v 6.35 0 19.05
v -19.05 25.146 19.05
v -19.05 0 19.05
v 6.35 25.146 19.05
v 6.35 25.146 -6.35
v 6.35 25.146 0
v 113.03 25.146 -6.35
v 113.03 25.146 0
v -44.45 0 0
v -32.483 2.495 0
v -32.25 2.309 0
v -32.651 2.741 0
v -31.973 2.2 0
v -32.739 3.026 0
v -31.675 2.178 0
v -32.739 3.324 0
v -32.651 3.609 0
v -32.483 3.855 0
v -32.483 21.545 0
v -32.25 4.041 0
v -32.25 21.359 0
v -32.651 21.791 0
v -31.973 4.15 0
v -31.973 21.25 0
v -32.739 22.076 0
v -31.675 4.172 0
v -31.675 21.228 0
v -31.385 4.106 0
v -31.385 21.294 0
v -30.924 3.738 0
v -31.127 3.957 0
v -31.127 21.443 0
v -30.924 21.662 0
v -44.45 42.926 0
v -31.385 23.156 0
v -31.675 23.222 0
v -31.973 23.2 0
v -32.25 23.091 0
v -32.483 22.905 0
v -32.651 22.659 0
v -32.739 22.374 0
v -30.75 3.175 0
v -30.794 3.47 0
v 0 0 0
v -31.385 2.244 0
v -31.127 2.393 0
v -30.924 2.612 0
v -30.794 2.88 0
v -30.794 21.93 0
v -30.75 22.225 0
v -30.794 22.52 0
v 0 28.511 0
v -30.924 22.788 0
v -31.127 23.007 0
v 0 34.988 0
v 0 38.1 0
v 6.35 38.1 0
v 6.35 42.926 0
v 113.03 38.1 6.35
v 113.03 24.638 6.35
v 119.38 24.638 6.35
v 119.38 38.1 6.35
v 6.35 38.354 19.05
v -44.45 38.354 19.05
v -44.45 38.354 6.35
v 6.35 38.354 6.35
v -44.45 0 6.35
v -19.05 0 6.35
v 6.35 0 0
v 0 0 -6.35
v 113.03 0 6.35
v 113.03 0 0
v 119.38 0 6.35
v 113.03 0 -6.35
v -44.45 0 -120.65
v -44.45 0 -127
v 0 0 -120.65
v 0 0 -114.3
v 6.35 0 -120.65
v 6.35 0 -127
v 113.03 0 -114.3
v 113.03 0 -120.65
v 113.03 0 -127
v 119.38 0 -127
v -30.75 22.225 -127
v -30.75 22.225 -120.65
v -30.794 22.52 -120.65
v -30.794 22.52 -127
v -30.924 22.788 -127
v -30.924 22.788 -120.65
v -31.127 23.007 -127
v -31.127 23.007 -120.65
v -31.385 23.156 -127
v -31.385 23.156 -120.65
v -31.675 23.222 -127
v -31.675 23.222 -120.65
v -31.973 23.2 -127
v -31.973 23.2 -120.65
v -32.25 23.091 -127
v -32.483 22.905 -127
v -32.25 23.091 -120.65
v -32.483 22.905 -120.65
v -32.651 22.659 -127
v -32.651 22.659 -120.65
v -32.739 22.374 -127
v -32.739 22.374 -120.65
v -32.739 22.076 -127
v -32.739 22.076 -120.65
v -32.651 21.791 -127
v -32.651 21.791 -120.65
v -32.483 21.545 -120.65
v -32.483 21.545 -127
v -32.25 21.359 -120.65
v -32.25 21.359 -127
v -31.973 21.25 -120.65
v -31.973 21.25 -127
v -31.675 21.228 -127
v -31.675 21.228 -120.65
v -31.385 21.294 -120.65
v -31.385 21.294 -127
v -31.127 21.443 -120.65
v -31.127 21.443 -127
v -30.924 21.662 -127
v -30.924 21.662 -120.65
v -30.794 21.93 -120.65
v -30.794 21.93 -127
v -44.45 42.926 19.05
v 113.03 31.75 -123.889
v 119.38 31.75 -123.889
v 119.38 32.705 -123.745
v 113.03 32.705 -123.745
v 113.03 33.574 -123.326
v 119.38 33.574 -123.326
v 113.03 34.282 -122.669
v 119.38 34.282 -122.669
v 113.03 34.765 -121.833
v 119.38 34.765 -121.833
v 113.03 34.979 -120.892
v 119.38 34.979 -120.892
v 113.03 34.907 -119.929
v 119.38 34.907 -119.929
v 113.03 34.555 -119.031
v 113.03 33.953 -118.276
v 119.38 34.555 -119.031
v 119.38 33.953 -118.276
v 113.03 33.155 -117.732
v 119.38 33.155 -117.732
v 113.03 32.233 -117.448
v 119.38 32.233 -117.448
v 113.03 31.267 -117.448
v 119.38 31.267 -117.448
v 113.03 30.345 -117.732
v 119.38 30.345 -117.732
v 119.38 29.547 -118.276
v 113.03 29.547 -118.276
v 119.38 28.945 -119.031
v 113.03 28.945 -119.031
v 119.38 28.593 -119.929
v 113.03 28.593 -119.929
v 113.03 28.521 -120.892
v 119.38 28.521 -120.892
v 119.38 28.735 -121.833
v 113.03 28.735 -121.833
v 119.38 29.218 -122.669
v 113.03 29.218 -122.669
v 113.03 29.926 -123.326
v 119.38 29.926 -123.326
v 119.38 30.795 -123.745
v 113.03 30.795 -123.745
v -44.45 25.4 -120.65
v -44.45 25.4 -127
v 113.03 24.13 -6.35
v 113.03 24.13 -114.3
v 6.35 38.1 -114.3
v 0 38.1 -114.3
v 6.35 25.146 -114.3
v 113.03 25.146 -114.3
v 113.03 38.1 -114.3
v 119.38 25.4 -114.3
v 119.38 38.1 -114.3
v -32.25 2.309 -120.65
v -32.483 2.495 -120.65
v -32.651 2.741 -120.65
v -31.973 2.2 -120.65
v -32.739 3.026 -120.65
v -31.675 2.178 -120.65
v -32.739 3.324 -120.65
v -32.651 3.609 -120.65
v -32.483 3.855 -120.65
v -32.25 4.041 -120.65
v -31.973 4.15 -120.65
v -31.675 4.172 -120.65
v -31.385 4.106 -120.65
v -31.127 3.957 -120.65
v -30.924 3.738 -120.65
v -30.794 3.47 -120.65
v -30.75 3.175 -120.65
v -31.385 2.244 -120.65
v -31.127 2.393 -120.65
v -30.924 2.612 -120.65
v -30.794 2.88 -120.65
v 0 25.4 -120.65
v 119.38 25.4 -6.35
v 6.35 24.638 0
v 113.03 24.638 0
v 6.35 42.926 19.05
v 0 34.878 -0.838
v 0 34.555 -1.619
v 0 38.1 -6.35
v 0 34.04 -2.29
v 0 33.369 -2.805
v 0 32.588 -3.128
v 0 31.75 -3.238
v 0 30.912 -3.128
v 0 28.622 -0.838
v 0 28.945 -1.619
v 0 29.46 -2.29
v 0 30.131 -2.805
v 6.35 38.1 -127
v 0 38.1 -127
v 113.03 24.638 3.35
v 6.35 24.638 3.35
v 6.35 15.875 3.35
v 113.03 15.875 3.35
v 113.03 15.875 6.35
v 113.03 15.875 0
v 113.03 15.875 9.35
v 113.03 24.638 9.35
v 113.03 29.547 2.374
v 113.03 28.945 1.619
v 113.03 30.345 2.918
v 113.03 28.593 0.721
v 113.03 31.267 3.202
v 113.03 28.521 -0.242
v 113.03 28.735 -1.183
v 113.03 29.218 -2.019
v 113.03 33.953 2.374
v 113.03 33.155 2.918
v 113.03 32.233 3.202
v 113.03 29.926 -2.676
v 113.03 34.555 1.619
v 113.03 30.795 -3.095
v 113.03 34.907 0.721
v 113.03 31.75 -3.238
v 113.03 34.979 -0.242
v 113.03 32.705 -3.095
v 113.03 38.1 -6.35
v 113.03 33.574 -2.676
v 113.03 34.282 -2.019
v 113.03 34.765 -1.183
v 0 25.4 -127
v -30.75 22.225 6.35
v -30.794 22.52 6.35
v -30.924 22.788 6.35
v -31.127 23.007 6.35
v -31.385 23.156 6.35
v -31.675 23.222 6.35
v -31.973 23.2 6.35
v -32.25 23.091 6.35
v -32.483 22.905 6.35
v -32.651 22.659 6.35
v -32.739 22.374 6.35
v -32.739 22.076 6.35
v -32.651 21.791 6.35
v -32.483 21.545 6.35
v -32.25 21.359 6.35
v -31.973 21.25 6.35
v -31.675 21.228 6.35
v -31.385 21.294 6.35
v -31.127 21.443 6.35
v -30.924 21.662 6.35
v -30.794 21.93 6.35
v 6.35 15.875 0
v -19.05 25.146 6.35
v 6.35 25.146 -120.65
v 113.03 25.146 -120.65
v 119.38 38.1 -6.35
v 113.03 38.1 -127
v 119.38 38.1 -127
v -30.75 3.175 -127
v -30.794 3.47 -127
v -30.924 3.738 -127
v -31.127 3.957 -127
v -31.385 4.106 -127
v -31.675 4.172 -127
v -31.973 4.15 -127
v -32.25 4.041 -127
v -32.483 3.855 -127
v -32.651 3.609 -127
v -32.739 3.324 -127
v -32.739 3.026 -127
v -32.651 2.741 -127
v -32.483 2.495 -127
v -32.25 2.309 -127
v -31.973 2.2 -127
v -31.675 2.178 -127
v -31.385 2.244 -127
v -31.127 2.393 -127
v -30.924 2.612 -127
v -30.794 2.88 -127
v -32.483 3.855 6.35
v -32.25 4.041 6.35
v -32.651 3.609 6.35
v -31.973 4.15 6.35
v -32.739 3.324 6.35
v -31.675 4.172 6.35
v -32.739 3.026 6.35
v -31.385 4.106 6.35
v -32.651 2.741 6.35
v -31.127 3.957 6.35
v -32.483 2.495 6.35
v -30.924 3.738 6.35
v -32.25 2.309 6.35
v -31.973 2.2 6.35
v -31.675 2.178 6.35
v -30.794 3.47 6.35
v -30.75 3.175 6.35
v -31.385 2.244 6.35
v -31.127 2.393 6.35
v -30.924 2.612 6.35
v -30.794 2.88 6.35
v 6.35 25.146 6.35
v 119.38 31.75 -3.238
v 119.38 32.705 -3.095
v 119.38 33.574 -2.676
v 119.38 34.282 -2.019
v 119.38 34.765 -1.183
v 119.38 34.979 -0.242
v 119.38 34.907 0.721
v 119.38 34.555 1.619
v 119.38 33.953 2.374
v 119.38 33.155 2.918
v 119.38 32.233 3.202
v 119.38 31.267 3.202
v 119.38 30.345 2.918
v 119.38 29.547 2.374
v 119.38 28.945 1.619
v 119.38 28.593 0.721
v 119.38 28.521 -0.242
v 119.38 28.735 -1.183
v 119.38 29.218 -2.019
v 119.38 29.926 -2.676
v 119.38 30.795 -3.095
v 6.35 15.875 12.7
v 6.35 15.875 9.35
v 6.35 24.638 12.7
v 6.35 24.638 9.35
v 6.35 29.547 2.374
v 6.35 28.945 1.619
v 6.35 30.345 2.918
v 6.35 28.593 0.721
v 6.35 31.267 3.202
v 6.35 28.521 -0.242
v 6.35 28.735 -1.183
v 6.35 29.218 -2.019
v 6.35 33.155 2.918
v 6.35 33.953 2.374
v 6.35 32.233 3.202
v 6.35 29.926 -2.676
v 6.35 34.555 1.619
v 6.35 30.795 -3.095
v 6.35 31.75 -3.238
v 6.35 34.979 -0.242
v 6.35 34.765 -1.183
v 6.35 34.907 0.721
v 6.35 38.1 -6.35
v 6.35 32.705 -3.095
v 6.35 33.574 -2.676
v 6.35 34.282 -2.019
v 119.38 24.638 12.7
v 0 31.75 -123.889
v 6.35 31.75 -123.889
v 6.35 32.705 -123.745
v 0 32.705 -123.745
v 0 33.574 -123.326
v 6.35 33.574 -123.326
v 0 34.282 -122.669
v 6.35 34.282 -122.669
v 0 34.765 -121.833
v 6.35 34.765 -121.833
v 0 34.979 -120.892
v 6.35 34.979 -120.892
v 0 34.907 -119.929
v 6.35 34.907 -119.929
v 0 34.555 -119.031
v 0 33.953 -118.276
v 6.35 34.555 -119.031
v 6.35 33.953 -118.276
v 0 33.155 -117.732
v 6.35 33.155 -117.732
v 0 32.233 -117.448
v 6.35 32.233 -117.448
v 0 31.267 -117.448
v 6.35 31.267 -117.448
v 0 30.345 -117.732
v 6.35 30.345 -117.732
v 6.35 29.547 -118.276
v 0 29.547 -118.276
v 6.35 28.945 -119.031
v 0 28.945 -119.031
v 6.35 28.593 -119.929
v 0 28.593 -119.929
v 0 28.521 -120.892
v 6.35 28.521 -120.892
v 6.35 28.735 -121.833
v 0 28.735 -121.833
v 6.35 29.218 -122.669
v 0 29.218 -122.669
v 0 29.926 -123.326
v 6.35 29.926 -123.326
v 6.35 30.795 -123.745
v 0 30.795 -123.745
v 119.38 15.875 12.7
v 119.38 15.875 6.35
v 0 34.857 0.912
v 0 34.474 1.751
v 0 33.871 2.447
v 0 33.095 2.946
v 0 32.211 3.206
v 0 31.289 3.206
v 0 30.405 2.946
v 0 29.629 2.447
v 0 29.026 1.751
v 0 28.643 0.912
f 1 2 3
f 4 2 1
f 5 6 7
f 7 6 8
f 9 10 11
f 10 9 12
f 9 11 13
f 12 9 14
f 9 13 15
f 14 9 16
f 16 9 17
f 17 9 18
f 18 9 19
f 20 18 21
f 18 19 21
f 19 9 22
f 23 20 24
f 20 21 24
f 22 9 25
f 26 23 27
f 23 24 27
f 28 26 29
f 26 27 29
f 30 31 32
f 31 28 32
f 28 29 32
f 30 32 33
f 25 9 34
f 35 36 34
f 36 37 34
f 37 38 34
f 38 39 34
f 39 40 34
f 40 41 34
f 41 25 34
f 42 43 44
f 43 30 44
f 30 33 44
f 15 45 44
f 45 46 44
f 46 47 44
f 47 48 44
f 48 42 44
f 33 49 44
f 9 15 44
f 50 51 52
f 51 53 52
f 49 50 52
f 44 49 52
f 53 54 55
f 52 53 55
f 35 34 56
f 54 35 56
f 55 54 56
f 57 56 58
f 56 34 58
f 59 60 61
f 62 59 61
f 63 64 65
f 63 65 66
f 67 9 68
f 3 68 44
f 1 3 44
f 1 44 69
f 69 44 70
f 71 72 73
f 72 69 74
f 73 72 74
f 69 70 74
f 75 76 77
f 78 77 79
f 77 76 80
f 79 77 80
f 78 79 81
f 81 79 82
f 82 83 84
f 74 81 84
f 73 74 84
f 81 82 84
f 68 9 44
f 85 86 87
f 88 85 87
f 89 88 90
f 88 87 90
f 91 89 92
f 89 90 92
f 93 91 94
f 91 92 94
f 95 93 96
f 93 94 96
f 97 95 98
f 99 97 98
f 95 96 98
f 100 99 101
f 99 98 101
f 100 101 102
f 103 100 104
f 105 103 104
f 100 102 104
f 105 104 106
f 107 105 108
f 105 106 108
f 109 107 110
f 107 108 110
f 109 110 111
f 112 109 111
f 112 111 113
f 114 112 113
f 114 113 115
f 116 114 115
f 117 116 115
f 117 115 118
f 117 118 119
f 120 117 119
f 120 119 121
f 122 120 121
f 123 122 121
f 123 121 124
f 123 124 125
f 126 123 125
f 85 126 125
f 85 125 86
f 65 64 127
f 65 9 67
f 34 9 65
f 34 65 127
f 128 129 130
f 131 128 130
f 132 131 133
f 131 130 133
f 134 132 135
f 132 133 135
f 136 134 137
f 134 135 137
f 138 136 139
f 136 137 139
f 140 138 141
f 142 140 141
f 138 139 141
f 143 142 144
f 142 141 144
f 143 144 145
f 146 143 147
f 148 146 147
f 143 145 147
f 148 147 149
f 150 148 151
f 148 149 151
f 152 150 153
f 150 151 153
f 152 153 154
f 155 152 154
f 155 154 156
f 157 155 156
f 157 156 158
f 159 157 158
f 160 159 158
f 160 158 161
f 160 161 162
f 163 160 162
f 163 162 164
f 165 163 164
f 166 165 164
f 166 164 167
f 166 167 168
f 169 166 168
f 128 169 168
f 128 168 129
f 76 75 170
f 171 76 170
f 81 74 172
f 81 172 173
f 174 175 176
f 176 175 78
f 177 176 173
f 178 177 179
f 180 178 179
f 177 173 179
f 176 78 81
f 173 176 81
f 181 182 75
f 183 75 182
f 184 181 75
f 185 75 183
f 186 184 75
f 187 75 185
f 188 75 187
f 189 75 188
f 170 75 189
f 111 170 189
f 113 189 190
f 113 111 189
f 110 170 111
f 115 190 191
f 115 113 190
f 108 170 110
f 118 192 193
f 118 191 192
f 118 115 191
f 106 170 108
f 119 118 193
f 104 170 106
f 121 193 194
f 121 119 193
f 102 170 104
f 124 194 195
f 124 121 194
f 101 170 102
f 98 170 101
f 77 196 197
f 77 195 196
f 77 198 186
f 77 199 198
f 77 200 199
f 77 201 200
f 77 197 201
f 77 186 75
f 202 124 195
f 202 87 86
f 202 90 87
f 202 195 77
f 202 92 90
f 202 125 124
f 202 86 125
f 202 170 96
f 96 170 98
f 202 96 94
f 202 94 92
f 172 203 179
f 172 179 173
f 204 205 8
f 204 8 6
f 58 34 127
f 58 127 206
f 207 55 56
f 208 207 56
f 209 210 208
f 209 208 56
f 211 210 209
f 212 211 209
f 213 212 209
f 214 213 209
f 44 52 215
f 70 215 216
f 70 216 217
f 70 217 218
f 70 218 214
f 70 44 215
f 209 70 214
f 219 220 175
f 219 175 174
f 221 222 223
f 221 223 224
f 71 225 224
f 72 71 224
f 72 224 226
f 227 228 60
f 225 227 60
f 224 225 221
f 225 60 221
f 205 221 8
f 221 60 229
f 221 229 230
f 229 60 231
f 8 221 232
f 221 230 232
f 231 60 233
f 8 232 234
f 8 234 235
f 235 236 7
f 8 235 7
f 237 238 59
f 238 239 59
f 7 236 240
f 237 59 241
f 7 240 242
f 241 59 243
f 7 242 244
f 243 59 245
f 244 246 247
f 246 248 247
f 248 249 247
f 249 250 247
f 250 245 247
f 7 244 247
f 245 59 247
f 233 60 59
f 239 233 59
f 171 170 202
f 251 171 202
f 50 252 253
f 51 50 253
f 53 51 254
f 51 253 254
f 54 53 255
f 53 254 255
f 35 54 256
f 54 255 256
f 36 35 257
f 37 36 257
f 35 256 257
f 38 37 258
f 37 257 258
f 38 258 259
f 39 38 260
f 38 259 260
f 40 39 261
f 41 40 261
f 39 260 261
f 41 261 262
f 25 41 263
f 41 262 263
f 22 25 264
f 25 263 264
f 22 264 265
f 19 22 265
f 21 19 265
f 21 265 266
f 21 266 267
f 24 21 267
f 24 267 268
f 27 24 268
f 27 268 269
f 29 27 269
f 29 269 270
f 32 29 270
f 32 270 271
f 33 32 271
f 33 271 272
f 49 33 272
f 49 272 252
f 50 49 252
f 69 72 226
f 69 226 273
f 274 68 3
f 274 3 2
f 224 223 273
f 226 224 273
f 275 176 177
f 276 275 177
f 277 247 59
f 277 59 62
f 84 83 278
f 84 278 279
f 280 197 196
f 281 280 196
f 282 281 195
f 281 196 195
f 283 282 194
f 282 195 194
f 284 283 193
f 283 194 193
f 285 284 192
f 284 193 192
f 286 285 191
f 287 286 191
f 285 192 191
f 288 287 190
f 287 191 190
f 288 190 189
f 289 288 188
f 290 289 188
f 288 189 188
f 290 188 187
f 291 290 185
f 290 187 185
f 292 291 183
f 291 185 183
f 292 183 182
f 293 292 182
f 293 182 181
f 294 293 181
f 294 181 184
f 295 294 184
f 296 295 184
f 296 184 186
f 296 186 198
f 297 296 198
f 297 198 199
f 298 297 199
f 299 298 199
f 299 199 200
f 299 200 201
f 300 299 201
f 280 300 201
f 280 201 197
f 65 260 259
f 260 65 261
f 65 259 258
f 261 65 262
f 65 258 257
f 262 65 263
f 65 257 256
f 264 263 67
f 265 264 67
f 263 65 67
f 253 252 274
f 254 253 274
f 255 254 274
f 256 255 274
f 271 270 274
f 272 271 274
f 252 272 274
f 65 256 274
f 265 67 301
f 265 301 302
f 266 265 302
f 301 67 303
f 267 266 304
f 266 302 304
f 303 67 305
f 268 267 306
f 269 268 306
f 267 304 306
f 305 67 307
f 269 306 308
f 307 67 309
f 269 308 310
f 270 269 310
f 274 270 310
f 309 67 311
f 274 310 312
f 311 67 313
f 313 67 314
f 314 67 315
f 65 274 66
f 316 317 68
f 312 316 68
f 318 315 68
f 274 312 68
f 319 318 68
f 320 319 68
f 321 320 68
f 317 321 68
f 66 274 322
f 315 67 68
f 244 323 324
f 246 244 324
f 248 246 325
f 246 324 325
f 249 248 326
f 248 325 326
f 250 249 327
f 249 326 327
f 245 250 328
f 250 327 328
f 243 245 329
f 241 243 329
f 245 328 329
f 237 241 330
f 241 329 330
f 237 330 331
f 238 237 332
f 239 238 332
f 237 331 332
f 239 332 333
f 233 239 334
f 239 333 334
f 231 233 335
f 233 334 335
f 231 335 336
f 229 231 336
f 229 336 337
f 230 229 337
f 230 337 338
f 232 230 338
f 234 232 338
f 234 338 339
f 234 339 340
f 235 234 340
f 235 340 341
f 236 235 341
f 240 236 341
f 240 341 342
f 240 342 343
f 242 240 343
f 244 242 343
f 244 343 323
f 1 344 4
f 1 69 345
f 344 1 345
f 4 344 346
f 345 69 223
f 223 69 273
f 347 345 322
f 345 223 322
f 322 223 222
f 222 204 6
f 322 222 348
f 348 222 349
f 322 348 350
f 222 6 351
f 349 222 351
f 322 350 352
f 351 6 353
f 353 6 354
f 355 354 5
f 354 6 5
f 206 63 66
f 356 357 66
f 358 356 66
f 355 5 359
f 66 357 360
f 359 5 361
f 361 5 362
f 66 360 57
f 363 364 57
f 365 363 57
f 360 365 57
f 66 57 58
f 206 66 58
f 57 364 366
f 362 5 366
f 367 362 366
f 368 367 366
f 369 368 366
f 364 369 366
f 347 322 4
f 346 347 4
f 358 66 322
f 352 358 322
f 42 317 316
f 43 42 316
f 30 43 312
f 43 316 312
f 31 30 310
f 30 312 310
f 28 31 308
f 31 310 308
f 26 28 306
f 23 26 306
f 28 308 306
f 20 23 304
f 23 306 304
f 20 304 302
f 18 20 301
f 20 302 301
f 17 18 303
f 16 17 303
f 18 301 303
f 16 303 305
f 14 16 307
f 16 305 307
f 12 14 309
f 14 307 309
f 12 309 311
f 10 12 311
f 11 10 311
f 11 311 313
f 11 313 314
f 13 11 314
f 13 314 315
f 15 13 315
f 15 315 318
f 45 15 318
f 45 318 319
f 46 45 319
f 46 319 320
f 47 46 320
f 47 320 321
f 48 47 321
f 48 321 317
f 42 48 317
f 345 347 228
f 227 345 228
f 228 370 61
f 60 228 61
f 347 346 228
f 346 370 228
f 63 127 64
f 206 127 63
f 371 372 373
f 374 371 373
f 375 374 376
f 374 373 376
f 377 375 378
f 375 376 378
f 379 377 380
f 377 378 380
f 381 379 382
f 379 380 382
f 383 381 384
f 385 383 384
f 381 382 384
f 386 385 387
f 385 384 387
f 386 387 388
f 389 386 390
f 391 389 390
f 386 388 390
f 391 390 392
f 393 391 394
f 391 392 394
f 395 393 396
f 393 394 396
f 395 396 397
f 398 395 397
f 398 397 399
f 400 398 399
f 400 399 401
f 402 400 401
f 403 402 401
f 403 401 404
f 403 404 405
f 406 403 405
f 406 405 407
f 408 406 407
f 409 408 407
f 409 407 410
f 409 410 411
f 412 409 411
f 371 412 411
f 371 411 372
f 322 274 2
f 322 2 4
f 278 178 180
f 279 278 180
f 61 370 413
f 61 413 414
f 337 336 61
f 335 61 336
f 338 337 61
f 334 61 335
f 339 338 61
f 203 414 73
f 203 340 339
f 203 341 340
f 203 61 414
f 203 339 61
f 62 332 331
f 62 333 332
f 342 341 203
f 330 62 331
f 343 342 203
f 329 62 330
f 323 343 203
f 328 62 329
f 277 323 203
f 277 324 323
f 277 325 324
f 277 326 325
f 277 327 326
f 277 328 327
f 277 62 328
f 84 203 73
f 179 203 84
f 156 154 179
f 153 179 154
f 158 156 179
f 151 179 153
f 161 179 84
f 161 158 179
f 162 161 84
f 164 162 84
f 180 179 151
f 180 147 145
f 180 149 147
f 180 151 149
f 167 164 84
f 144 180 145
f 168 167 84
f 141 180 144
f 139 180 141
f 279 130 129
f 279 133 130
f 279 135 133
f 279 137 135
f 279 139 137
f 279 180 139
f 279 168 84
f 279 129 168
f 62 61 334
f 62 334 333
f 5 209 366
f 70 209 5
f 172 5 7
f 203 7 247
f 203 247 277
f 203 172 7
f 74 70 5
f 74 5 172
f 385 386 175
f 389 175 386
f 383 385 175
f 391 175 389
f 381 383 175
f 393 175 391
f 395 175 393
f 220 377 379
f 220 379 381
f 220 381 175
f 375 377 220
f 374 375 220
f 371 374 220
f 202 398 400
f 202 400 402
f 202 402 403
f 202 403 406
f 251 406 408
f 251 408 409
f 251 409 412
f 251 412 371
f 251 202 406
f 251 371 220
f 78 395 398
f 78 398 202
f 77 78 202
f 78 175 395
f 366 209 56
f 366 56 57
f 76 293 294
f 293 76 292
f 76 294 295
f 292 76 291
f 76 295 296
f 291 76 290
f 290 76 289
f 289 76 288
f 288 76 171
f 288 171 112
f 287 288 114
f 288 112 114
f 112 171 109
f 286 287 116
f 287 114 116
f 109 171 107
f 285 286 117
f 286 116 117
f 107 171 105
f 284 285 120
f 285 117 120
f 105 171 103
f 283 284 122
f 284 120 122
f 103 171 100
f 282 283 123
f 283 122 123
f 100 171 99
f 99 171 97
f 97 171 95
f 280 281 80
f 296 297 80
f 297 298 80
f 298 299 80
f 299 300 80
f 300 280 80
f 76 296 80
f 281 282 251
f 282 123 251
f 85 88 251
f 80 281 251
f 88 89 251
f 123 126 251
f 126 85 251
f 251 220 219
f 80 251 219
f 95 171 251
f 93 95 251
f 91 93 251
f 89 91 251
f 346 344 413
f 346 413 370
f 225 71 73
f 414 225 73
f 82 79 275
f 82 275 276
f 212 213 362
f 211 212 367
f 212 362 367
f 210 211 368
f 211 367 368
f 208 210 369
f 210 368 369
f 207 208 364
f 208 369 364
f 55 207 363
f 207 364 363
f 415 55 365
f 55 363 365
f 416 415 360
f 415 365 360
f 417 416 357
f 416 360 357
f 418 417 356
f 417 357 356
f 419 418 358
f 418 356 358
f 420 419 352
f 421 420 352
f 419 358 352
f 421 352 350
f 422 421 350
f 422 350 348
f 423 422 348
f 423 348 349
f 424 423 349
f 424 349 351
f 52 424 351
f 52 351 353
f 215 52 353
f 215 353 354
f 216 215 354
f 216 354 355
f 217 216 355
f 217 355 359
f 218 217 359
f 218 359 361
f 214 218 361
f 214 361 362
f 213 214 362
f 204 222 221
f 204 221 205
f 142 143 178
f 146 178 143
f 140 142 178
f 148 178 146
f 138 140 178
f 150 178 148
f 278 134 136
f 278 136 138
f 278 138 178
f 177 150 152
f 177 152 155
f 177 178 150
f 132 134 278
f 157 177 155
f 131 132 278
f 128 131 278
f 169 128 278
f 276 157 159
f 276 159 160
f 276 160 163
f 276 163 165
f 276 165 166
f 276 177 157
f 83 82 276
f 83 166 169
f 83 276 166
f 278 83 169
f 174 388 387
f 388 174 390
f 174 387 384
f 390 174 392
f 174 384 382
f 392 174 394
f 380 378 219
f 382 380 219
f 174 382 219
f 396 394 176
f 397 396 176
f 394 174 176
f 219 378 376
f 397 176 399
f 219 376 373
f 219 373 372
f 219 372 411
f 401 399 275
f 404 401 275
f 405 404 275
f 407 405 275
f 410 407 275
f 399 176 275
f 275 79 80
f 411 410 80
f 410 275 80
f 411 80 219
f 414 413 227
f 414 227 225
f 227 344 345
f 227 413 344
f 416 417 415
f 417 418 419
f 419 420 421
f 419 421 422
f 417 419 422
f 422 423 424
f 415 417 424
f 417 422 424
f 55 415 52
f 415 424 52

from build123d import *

# Parameters (mm, degrees)
BOSS_EXTRUDE1_DEPTH     = 25.4
CUT_EXTRUDE1_START      = -6.35
CUT_EXTRUDE1_DEPTH      = 107.95
SKETCH3_W               = 50.8
SKETCH3_H               = 25.4
BOSS_EXTRUDE2_DEPTH     = 6.35
BOSS_EXTRUDE3_START     = -120.65
SKETCH3_2_W             = 50.8
SKETCH3_2_H             = 25.4
BOSS_EXTRUDE3_DEPTH     = 6.35
BOSS_EXTRUDE4_START     = -25.4
SKETCH8_W               = 6.35
SKETCH8_H               = 12.7
BOSS_EXTRUDE4_DEPTH     = 38.1
SKETCH9_R               = 3.2385
CUT_EXTRUDE2_DEPTH      = 1
CUT_EXTRUDE2_DEPTH_BACK = 164.83
SKETCH10_R              = 1.000000032
CUT_EXTRUDE3_DEPTH      = 134.35
SKETCH11_W              = 25.4
SKETCH11_H              = 25.146
BOSS_EXTRUDE5_DEPTH     = 12.7
SKETCH13_W              = 44.45
SKETCH13_H              = 6.35
BOSS_EXTRUDE6_DEPTH     = 12.7
BOSS_EXTRUDE7_START     = -6.35
SKETCH15_W              = 50.8
SKETCH15_H              = 4.826
BOSS_EXTRUDE7_DEPTH     = 19.05
SKETCH17_W              = 50.8
SKETCH17_H              = 0.254
CUT_EXTRUDE4_DEPTH      = 12.7
SKETCH19_W              = 12.7
SKETCH19_H              = 8.763
BOSS_EXTRUDE8_DEPTH     = 113.03
SKETCH20_W              = 106.68
SKETCH20_H              = 0.254
CUT_EXTRUDE5_DEPTH      = 128
SKETCH22_W              = 106.68
SKETCH22_H              = 5.999999938
CUT_EXTRUDE6_DEPTH      = 25.638


with BuildPart() as part:
    # Sketch1 → Boss-Extrude1 (new body)
    with BuildSketch(Plane(origin=(0, 0, 0), x_dir=(1, 0, 0), z_dir=(0, 1, 0))):
        Polygon((3.175, 114.3), (0, 114.3), (0, 120.65), (119.38, 120.65), (119.38, 0), (0, 0), (0, 6.35), (3.175, 6.35), (113.03, 6.35), (113.03, 114.3), align=None)
    extrude(amount=BOSS_EXTRUDE1_DEPTH)

    # Sketch2 → Cut-Extrude1 (cut)
    with BuildSketch(Plane.XY.offset(CUT_EXTRUDE1_START)):
        Polygon((119.38, 25.4), (113.03, 24.13), (113.03, 25.4), align=None)
    extrude(amount=-CUT_EXTRUDE1_DEPTH, mode=Mode.SUBTRACT)

    # Sketch3 → Boss-Extrude2 (add)
    with BuildSketch(Plane.XY):
        with Locations((-19.05, 12.7)):
            Rectangle(SKETCH3_W, SKETCH3_H)
    extrude(amount=BOSS_EXTRUDE2_DEPTH)

    # Sketch3<2> → Boss-Extrude3 (add)
    with BuildSketch(Plane.XY.offset(BOSS_EXTRUDE3_START)):
        with Locations((-19.05, 12.7)):
            Rectangle(SKETCH3_2_W, SKETCH3_2_H)
    extrude(amount=-BOSS_EXTRUDE3_DEPTH)

    # Sketch8 → Boss-Extrude4 (add)
    with BuildSketch(Plane(origin=(0, 25.4, 0), x_dir=(1, 0, 0), z_dir=(0, 1, 0)).offset(BOSS_EXTRUDE4_START)):
        with Locations((116.205, 0)):
            Rectangle(SKETCH8_W, SKETCH8_H)
        with Locations((3.175, 0)):
            Rectangle(SKETCH8_W, SKETCH8_H)
        with Locations((3.175, 120.65)):
            Rectangle(SKETCH8_W, SKETCH8_H)
        with Locations((116.205, 120.65)):
            Rectangle(SKETCH8_W, SKETCH8_H)
    extrude(amount=BOSS_EXTRUDE4_DEPTH)

    # Sketch9 → Cut-Extrude2 (cut, two sides)
    with BuildSketch(Plane(origin=(119.38, 0, 0), x_dir=(0, 0, -1), z_dir=(1, 0, 0))) as cut_extrude2_sk:
        with Locations((0, 31.75)):
            Circle(SKETCH9_R)
        with Locations((120.65, 31.75)):
            Circle(SKETCH9_R)
    extrude(amount=CUT_EXTRUDE2_DEPTH, mode=Mode.SUBTRACT)
    extrude(cut_extrude2_sk.sketch, amount=-CUT_EXTRUDE2_DEPTH_BACK, mode=Mode.SUBTRACT)

    # Sketch10 → Cut-Extrude3 (cut, through all)
    with BuildSketch(Plane.XY.offset(6.35)):
        with Locations((-31.75, 22.225)):
            Circle(SKETCH10_R)
        with Locations((-31.75, 3.175)):
            Circle(SKETCH10_R)
    extrude(amount=-CUT_EXTRUDE3_DEPTH, mode=Mode.SUBTRACT)

    # Sketch11 → Boss-Extrude5 (add)
    with BuildSketch(Plane.XY.offset(6.35)):
        with Locations((-6.35, 12.573)):
            Rectangle(SKETCH11_W, SKETCH11_H)
    extrude(amount=BOSS_EXTRUDE5_DEPTH)

    # Sketch13 → Boss-Extrude6 (add)
    with BuildSketch(Plane(origin=(0, 25.4, 0), x_dir=(1, 0, 0), z_dir=(0, 1, 0))):
        with Locations((-22.225, -3.175)):
            Rectangle(SKETCH13_W, SKETCH13_H)
    extrude(amount=BOSS_EXTRUDE6_DEPTH)

    # Sketch15 → Boss-Extrude7 (add)
    with BuildSketch(Plane.XY.offset(6.35).offset(BOSS_EXTRUDE7_START)):
        with Locations((-19.05, 40.513)):
            Rectangle(SKETCH15_W, SKETCH15_H)
    extrude(amount=BOSS_EXTRUDE7_DEPTH)

    # Sketch17 → Cut-Extrude4 (cut)
    with BuildSketch(Plane.XY.offset(19.05)):
        with Locations((-19.05, 38.227)):
            Rectangle(SKETCH17_W, SKETCH17_H)
    extrude(amount=-CUT_EXTRUDE4_DEPTH, mode=Mode.SUBTRACT)

    # Sketch19 → Boss-Extrude8 (add)
    with BuildSketch(Plane(origin=(6.35, 0, 0), x_dir=(0, 0, -1), z_dir=(1, 0, 0))):
        with Locations((-6.35, 20.2565)):
            Rectangle(SKETCH19_W, SKETCH19_H)
    extrude(amount=BOSS_EXTRUDE8_DEPTH)

    # Sketch20 → Cut-Extrude5 (cut, through all)
    with BuildSketch(Plane.XY):
        with Locations((59.69, 25.273)):
            Rectangle(SKETCH20_W, SKETCH20_H)
    extrude(amount=-CUT_EXTRUDE5_DEPTH, mode=Mode.SUBTRACT)

    # Sketch22 → Cut-Extrude6 (cut, through all)
    with BuildSketch(Plane(origin=(0, 24.638, 0), x_dir=(1, 0, 0), z_dir=(0, 1, 0))):
        with Locations((59.69, -6.35)):
            Rectangle(SKETCH22_W, SKETCH22_H)
    extrude(amount=-CUT_EXTRUDE6_DEPTH, mode=Mode.SUBTRACT)


solid = part.part
